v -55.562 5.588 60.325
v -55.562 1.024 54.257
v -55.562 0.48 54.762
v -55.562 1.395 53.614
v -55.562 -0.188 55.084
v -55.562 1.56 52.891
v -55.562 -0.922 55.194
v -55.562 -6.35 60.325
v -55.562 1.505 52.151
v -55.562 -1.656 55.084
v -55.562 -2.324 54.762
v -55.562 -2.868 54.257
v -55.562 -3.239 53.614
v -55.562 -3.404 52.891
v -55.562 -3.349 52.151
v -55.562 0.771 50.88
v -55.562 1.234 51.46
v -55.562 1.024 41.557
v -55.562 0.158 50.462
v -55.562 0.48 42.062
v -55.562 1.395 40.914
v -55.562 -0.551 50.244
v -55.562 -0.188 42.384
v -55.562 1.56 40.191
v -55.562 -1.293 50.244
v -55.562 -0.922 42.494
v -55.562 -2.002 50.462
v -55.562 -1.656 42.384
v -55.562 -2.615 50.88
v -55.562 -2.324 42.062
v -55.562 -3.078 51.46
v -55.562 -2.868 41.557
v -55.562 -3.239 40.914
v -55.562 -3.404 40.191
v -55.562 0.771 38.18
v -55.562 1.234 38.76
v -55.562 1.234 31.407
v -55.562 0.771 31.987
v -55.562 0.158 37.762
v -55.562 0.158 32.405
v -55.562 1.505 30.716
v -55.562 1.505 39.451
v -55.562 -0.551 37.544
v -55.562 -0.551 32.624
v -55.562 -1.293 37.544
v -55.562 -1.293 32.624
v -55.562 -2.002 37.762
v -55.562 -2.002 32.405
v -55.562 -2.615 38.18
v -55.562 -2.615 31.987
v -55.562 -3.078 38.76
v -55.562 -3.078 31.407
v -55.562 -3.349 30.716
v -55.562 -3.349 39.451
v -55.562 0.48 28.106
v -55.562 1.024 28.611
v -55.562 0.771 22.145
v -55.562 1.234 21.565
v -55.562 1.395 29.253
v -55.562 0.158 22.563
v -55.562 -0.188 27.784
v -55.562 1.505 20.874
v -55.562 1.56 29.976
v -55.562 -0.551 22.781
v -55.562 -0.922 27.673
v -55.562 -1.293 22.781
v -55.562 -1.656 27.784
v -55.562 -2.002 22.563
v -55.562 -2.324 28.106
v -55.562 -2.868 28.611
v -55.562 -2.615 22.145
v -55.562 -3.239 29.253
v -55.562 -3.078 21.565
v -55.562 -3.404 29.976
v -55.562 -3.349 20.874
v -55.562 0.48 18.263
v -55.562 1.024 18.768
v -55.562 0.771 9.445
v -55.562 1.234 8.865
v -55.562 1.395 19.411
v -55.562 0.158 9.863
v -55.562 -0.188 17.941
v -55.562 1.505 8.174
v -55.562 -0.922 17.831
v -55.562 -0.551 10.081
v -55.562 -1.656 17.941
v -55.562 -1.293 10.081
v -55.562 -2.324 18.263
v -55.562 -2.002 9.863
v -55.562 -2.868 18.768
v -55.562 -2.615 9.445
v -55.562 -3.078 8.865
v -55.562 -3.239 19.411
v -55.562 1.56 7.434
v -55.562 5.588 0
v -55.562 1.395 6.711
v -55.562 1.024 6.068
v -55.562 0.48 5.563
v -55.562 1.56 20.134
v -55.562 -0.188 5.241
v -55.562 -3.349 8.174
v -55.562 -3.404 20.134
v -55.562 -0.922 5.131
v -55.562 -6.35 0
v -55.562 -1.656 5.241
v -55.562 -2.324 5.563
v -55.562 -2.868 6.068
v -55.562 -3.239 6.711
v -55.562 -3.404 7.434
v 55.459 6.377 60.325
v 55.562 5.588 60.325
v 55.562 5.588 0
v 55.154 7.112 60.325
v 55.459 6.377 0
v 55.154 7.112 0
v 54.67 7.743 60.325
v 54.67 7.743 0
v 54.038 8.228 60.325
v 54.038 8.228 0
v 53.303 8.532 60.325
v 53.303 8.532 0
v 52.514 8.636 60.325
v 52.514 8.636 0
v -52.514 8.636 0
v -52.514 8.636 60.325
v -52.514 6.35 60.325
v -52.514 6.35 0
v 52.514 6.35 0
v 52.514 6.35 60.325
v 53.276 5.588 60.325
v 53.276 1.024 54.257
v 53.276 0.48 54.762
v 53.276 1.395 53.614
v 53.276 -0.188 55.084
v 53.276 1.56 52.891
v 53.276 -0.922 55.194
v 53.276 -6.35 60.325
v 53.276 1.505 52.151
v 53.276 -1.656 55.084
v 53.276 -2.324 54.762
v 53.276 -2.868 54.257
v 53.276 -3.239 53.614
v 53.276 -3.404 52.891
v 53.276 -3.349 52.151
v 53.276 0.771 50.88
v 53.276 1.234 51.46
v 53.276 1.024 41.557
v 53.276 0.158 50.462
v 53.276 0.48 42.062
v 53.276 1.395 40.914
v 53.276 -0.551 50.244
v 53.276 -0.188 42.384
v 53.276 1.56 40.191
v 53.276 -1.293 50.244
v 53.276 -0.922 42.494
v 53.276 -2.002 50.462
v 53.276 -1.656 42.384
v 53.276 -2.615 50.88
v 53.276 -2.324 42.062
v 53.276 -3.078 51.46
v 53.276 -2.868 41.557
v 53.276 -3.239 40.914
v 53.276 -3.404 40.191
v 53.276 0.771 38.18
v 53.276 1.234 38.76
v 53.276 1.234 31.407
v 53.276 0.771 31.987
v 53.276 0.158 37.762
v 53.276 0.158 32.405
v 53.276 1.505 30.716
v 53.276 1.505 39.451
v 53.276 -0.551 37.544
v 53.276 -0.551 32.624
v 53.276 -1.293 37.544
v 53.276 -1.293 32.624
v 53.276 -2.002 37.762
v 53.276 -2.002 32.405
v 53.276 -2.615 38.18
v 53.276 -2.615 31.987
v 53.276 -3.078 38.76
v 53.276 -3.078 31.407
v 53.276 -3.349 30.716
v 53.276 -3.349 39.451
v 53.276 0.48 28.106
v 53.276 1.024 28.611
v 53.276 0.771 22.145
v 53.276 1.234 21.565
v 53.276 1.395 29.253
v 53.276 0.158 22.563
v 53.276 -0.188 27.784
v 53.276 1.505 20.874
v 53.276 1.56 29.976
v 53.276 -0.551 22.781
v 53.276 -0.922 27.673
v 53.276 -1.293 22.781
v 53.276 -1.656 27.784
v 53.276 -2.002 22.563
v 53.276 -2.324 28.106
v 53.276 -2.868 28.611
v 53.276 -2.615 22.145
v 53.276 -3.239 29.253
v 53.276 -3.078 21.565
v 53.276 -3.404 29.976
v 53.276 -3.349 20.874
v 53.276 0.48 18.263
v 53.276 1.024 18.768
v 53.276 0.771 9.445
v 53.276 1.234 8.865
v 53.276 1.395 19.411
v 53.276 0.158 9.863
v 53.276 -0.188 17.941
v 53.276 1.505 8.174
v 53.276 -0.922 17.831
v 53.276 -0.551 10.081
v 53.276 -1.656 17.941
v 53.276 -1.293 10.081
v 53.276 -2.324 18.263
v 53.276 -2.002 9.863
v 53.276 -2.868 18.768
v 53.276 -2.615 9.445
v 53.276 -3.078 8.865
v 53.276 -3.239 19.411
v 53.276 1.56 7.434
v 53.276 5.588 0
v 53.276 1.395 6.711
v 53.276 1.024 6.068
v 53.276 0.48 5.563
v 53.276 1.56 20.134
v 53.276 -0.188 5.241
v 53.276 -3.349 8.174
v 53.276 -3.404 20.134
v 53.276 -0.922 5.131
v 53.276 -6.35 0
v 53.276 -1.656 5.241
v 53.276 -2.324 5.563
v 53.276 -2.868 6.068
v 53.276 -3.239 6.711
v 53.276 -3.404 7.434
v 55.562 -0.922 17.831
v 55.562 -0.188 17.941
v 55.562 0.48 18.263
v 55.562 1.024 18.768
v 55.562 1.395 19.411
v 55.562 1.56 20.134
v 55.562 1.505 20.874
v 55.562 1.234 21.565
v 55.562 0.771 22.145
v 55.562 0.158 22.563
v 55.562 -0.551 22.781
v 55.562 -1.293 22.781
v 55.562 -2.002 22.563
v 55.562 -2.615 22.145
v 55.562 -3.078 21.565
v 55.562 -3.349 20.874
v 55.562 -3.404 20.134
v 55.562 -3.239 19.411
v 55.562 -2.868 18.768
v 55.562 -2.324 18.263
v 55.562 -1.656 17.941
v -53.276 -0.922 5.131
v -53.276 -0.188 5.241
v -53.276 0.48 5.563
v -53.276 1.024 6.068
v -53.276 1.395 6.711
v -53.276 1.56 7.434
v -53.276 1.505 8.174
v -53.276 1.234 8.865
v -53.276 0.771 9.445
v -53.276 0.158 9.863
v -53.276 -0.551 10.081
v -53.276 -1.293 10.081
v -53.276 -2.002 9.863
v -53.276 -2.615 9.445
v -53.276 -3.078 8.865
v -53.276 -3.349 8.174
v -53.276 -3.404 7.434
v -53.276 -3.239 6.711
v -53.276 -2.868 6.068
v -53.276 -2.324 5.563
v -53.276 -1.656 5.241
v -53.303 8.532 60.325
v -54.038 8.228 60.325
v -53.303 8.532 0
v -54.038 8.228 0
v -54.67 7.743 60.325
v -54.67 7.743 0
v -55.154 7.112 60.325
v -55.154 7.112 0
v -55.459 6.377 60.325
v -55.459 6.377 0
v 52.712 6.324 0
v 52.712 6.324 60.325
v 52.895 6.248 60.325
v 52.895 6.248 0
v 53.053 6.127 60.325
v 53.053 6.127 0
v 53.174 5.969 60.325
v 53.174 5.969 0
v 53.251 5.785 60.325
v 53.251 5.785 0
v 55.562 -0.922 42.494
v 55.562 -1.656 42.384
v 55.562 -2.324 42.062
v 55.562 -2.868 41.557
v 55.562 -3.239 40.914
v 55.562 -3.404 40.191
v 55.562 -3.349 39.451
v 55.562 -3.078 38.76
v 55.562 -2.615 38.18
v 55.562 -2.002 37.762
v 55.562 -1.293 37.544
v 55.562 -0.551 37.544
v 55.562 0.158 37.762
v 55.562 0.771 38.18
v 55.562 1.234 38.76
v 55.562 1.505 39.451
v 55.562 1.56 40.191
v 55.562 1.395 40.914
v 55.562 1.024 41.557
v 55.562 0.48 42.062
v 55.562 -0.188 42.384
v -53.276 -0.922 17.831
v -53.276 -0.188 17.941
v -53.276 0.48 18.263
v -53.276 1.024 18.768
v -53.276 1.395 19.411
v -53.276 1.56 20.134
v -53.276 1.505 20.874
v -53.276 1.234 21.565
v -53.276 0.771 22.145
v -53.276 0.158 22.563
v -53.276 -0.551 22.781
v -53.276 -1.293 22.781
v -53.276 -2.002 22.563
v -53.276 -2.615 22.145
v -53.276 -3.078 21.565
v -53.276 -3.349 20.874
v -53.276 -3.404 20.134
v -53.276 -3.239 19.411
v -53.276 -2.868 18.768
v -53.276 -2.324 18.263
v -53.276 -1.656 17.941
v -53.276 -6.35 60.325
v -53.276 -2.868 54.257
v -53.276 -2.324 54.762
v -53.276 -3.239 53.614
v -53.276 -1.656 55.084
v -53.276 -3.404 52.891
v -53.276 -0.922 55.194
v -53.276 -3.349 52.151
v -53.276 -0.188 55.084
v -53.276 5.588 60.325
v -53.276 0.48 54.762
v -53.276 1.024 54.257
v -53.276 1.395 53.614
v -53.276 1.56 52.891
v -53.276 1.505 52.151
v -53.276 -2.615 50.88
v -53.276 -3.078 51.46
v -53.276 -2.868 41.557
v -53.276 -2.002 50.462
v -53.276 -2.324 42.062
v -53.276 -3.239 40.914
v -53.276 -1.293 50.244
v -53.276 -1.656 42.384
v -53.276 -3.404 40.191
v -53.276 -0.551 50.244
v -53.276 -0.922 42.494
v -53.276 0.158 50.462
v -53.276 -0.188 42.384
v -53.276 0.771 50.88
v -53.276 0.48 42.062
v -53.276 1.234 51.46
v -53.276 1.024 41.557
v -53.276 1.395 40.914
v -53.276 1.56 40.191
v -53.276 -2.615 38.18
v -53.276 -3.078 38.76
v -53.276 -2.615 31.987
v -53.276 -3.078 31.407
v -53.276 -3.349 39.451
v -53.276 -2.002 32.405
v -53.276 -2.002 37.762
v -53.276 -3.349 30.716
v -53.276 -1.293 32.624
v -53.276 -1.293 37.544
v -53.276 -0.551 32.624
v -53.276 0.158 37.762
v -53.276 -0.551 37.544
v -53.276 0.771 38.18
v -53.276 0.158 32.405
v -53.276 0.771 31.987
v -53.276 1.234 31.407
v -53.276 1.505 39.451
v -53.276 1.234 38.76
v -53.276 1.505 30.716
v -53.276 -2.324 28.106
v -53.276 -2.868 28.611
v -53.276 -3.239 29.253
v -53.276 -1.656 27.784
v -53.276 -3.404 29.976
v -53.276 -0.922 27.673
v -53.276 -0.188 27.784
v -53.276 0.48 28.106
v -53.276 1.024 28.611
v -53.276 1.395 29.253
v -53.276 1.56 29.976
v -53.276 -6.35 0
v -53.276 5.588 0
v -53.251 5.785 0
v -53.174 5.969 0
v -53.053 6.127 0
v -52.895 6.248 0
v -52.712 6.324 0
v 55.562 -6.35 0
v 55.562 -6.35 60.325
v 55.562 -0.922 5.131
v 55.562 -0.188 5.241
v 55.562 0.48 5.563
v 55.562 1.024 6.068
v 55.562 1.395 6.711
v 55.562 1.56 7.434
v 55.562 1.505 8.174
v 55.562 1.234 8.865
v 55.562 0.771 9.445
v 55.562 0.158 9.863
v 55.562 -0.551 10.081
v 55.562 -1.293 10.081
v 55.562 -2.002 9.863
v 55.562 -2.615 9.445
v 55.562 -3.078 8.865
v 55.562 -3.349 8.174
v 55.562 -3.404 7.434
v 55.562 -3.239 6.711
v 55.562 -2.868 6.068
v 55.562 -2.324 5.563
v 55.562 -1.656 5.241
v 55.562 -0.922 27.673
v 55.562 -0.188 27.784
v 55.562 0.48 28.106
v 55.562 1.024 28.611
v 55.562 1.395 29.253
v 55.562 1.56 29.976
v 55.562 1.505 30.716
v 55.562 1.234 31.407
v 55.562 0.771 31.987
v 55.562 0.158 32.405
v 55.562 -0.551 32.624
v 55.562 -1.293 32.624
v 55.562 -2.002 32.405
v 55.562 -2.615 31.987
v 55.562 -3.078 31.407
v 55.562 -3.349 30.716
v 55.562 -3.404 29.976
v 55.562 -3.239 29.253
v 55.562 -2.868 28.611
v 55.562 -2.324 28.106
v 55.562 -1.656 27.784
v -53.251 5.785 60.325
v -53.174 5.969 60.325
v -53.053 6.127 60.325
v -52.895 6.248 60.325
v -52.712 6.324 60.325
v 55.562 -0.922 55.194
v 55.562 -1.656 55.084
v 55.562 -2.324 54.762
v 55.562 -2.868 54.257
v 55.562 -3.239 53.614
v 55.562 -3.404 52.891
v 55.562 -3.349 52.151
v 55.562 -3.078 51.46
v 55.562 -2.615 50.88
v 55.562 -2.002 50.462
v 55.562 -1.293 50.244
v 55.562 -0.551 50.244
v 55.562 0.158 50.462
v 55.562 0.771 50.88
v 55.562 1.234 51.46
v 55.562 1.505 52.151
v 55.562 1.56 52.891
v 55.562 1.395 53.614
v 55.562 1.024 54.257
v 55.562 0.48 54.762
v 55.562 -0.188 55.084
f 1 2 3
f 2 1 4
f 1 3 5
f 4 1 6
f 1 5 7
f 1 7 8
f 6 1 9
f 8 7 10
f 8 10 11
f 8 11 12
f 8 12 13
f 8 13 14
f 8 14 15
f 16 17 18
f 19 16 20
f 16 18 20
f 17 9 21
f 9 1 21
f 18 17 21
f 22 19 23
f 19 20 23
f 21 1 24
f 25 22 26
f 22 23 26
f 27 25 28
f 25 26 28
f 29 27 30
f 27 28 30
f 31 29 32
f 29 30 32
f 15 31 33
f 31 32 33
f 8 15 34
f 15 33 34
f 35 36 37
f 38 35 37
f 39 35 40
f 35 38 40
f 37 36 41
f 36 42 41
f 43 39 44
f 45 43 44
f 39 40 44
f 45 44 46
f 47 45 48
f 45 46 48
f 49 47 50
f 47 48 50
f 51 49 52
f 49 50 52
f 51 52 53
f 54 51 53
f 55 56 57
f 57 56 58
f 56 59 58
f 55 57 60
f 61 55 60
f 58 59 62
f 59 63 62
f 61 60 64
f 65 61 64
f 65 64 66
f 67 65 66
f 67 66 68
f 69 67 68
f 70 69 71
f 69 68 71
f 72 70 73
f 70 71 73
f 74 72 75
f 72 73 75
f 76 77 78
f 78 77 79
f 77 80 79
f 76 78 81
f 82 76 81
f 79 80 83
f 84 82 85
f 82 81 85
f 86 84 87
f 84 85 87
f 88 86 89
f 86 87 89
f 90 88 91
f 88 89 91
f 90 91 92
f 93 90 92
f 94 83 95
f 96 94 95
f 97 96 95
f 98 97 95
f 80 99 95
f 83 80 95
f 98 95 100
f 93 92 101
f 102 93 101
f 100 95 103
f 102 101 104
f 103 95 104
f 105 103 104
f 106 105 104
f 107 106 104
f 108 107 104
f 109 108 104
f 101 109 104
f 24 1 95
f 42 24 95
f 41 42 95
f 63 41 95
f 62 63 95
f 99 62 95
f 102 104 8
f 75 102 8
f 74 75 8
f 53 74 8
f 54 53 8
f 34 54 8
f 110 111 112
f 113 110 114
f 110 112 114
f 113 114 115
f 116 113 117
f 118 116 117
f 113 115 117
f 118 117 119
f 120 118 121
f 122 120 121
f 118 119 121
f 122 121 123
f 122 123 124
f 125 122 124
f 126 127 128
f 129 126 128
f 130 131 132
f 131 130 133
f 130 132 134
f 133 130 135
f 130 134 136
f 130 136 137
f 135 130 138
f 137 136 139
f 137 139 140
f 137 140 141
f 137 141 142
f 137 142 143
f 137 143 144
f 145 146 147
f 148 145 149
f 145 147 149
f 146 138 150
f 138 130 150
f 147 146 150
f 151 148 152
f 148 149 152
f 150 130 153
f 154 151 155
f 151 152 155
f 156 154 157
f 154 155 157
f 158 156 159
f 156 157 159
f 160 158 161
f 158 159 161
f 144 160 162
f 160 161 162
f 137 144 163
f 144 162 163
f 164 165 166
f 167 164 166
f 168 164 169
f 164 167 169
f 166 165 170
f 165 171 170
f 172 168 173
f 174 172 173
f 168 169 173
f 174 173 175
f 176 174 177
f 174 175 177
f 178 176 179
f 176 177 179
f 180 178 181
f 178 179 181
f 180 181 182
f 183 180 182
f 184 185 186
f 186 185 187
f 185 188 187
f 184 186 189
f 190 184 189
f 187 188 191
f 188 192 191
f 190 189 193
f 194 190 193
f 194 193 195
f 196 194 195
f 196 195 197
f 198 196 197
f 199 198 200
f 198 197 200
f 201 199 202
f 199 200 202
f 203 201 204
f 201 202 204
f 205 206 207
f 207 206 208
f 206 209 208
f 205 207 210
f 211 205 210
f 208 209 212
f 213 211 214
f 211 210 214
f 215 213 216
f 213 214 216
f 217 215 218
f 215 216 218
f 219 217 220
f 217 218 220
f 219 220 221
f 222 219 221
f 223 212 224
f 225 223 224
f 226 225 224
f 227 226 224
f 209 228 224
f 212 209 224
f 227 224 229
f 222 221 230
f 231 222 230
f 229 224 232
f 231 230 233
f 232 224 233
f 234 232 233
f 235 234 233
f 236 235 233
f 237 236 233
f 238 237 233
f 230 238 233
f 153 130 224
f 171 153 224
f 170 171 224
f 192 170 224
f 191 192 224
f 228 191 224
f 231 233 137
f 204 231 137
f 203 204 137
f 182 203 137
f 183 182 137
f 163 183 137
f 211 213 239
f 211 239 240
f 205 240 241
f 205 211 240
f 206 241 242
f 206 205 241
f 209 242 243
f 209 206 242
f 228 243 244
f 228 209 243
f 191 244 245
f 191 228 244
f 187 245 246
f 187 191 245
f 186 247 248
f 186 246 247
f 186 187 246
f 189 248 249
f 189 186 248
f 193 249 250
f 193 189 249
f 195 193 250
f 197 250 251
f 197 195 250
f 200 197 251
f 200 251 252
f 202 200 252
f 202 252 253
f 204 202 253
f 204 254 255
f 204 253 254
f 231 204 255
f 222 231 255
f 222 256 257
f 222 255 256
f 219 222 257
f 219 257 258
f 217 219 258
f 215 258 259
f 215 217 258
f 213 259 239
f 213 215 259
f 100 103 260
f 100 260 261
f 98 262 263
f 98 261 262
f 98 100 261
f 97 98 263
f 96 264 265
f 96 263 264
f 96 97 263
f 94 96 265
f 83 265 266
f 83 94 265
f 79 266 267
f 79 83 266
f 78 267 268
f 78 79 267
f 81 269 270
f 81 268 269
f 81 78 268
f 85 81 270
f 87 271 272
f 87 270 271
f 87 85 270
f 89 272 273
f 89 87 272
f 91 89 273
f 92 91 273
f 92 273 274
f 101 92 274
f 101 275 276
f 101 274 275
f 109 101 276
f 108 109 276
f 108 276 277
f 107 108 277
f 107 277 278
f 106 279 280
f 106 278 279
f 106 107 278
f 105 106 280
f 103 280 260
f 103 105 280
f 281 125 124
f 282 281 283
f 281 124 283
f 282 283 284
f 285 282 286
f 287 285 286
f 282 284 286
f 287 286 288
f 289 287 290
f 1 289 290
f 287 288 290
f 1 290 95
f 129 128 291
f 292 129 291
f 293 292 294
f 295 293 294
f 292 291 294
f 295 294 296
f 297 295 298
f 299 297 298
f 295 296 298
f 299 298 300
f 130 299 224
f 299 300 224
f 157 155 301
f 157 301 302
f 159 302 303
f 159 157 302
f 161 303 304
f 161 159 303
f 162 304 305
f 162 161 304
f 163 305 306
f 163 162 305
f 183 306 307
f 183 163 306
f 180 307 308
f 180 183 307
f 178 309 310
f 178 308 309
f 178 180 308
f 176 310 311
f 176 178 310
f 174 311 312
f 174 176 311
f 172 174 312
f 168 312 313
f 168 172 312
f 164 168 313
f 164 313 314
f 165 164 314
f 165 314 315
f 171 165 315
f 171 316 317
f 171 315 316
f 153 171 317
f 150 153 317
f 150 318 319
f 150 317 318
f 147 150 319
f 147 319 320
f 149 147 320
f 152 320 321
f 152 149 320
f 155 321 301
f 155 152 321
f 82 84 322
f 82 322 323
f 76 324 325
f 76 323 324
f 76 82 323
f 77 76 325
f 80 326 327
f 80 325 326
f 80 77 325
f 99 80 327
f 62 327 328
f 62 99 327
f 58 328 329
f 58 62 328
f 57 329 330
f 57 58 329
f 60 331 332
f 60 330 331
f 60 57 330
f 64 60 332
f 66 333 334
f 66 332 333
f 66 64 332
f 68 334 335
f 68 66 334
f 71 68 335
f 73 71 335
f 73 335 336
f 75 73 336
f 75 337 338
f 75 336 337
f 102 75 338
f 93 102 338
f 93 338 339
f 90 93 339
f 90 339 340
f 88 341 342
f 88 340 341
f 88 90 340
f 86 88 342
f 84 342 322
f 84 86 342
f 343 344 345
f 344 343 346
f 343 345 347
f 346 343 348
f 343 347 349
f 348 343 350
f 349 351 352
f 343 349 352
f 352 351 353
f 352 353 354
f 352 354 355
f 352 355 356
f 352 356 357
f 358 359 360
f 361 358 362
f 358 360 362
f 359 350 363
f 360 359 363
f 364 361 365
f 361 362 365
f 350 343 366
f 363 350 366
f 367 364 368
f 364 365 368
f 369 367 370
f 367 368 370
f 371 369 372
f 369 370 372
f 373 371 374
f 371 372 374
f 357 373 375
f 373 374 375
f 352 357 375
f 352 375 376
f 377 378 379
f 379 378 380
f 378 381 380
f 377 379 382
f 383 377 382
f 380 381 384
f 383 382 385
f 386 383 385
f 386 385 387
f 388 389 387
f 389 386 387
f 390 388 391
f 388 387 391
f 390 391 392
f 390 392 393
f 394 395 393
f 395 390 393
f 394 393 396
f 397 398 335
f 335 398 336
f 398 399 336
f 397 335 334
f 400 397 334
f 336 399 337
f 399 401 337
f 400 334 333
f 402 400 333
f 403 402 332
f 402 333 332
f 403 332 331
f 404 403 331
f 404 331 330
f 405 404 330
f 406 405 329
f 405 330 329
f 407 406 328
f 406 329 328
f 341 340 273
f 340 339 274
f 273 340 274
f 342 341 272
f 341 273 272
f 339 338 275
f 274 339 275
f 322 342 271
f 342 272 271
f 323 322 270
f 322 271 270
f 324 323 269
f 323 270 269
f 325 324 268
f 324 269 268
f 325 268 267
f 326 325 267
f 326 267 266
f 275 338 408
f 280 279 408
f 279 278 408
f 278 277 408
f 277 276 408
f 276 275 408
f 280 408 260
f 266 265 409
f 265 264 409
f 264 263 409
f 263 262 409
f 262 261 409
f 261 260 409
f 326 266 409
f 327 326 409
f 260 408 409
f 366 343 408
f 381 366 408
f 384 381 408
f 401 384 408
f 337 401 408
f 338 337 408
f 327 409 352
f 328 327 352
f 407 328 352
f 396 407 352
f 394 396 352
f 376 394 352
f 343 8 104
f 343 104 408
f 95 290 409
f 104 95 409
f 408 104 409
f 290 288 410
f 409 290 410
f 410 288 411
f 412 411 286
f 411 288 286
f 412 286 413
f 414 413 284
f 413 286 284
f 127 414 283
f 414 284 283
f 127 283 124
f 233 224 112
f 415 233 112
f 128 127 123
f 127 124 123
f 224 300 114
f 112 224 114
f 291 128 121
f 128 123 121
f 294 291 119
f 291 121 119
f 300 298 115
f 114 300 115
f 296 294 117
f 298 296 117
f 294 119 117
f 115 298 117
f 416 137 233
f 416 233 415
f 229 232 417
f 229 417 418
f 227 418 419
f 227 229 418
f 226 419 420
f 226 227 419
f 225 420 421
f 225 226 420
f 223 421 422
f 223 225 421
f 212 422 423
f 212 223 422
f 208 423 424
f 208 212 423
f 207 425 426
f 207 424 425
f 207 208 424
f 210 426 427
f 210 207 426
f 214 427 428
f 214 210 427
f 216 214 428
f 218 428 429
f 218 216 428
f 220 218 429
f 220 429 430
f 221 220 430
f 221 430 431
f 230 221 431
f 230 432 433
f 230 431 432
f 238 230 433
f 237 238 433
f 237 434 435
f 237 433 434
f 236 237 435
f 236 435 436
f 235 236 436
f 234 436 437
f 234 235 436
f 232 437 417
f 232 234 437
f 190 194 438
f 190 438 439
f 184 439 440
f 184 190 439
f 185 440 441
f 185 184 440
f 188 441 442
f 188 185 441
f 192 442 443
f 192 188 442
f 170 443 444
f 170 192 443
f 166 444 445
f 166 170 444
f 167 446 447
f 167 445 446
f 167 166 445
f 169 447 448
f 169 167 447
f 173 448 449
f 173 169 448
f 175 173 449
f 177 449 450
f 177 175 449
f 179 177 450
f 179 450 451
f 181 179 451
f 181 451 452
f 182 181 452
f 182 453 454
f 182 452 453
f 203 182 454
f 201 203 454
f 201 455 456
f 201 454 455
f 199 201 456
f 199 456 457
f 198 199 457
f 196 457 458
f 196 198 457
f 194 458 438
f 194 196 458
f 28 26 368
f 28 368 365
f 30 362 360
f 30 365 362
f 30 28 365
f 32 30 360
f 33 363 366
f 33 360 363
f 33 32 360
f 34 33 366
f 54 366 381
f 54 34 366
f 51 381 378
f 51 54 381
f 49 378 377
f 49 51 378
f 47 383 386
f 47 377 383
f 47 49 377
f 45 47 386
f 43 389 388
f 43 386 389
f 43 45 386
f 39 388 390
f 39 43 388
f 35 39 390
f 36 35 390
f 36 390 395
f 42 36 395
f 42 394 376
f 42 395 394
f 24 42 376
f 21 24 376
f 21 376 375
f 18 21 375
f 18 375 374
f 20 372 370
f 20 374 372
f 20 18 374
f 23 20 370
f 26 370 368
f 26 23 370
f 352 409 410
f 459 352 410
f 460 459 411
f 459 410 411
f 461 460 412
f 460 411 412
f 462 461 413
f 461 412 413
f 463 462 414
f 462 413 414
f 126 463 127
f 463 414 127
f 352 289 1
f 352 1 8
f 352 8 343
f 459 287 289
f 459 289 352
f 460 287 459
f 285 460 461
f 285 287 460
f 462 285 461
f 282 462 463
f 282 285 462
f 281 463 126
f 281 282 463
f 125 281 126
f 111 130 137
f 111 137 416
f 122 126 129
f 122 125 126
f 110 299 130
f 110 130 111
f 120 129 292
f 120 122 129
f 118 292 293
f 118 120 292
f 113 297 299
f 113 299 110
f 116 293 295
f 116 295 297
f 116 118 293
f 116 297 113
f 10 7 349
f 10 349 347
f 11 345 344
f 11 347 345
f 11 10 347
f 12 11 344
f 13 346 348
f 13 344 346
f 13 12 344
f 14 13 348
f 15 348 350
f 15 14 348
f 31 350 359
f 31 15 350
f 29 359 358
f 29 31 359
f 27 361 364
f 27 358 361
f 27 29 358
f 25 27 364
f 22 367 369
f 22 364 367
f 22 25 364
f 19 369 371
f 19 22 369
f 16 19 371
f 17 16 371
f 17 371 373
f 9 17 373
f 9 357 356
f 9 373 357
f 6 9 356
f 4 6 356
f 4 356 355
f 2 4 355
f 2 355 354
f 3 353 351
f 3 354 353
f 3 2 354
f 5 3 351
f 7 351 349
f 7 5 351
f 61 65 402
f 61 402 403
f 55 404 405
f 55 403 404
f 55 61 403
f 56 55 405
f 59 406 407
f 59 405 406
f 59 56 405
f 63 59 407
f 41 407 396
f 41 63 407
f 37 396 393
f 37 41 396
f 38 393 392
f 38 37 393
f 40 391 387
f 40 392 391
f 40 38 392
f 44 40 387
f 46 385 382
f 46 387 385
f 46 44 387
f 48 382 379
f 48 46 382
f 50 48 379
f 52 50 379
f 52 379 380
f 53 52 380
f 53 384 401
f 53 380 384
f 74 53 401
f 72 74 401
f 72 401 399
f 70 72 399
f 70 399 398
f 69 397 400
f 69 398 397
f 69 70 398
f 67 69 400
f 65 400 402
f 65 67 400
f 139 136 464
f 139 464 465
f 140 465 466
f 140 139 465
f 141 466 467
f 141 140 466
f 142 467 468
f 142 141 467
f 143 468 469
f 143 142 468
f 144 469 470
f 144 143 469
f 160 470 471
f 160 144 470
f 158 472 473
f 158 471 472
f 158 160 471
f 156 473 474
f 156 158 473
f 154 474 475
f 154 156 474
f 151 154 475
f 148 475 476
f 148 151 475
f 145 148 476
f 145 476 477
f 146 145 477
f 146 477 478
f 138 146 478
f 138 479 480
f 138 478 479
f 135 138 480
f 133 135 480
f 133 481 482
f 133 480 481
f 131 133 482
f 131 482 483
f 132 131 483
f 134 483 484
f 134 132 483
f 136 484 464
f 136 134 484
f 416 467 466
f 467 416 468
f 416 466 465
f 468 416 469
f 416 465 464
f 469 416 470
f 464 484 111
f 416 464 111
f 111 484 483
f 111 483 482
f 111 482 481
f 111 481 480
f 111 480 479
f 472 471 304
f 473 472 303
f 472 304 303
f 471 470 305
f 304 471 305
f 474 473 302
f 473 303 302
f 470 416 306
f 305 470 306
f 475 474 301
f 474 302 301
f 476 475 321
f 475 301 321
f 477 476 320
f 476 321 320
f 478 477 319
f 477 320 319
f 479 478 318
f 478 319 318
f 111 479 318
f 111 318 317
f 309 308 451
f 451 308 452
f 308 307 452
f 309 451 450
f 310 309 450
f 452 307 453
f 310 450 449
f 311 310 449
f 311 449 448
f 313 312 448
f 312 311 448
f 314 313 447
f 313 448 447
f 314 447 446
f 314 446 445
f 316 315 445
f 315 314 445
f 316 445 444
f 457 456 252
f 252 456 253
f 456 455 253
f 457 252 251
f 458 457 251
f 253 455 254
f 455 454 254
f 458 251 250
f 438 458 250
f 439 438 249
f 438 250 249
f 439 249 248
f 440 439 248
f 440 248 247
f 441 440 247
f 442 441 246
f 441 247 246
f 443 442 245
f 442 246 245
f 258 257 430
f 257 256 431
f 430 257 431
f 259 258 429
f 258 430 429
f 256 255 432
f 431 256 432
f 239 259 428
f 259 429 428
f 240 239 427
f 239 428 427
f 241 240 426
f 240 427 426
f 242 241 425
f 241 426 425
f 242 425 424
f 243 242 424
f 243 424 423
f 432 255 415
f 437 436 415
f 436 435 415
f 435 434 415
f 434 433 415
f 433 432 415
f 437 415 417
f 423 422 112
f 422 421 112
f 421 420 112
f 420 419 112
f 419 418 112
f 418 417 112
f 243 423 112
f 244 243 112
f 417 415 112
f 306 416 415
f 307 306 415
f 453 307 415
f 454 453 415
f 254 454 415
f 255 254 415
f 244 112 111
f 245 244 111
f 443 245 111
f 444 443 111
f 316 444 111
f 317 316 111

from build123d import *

# Parameters (mm, degrees)
BASE_FLANGE1_DEPTH      = 60.325
CUT_EXTRUDE1_DEPTH      = 83.467433131
CUT_EXTRUDE1_DEPTH_BACK = 83.467433131
SKETCH6_R               = 2.4892


# Sheet-metal steps are written as plain solids
with BuildPart() as part:
    # Sketch1 → Base-Flange1 (new body)
    with BuildSketch(Plane.XY):
        with BuildLine():
            Line((-53.2765, -6.35), (-53.2765, 5.588))
            ThreePointArc((-53.2765, 5.588), (-53.053315367, 6.126815367), (-52.5145, 6.35))
            Line((-52.5145, 6.35), (52.5145, 6.35))
            ThreePointArc((52.5145, 6.35), (53.053315367, 6.126815367), (53.2765, 5.588))
            Line((53.2765, 5.588), (53.2765, -6.35))
            Line((53.2765, -6.35), (55.5625, -6.35))
            Line((55.5625, -6.35), (55.5625, 5.588))
            ThreePointArc((55.5625, 5.588), (54.669761469, 7.743261469), (52.5145, 8.636))
            Line((52.5145, 8.636), (-52.5145, 8.636))
            ThreePointArc((-52.5145, 8.636), (-54.669761469, 7.743261469), (-55.5625, 5.588))
            Line((-55.5625, 5.588), (-55.5625, -6.35))
            Line((-55.5625, -6.35), (-53.2765, -6.35))
        make_face()
    extrude(amount=BASE_FLANGE1_DEPTH)

    # Sketch6 → Cut-Extrude1 (cut, two sides: drawn at the far end of the back side and taken through both)
    with BuildSketch(Plane(origin=(0, 0, 0), x_dir=(0, 0, -1), z_dir=(1, 0, 0)).offset(-CUT_EXTRUDE1_DEPTH_BACK)):
        with Locations((-30.1625, -0.92202)):
            Circle(SKETCH6_R)
        with Locations((-20.32, -0.92202)):
            Circle(SKETCH6_R)
        with Locations((-7.62, -0.92202)):
            Circle(SKETCH6_R)
        with Locations(Location((-52.705, -0.92202, 0), (0, 0, 180))):
            Circle(SKETCH6_R)
        with Locations(Location((-40.005, -0.92202, 0), (0, 0, 180))):
            Circle(SKETCH6_R)
    extrude(amount=CUT_EXTRUDE1_DEPTH + CUT_EXTRUDE1_DEPTH_BACK, mode=Mode.SUBTRACT)


solid = part.part
